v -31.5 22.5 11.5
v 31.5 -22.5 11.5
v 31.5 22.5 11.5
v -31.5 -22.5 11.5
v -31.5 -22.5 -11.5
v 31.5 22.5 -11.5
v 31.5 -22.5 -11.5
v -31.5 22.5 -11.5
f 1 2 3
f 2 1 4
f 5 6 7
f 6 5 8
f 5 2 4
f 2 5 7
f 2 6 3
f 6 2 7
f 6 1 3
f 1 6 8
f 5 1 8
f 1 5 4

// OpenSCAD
// Parameters
length = 63; //[31.5:126:0.5]
width = 45; //[22.5:90:0.5]
height = 23; //[11.5:46:0.5]
corner_radius = 0; //[0:6:0.5]
origin_reference = 0; //[0:0:1]

// Solid State Relay (SSR) Module - Simplified Envelope
module mod() {
  color([0.85, 0.85, 0.8]) { // Off-white for SSR body
    cube([length, width, height], center=true);
  }
}

// Assembly
module assembly() {
  mod();
}

assembly();
